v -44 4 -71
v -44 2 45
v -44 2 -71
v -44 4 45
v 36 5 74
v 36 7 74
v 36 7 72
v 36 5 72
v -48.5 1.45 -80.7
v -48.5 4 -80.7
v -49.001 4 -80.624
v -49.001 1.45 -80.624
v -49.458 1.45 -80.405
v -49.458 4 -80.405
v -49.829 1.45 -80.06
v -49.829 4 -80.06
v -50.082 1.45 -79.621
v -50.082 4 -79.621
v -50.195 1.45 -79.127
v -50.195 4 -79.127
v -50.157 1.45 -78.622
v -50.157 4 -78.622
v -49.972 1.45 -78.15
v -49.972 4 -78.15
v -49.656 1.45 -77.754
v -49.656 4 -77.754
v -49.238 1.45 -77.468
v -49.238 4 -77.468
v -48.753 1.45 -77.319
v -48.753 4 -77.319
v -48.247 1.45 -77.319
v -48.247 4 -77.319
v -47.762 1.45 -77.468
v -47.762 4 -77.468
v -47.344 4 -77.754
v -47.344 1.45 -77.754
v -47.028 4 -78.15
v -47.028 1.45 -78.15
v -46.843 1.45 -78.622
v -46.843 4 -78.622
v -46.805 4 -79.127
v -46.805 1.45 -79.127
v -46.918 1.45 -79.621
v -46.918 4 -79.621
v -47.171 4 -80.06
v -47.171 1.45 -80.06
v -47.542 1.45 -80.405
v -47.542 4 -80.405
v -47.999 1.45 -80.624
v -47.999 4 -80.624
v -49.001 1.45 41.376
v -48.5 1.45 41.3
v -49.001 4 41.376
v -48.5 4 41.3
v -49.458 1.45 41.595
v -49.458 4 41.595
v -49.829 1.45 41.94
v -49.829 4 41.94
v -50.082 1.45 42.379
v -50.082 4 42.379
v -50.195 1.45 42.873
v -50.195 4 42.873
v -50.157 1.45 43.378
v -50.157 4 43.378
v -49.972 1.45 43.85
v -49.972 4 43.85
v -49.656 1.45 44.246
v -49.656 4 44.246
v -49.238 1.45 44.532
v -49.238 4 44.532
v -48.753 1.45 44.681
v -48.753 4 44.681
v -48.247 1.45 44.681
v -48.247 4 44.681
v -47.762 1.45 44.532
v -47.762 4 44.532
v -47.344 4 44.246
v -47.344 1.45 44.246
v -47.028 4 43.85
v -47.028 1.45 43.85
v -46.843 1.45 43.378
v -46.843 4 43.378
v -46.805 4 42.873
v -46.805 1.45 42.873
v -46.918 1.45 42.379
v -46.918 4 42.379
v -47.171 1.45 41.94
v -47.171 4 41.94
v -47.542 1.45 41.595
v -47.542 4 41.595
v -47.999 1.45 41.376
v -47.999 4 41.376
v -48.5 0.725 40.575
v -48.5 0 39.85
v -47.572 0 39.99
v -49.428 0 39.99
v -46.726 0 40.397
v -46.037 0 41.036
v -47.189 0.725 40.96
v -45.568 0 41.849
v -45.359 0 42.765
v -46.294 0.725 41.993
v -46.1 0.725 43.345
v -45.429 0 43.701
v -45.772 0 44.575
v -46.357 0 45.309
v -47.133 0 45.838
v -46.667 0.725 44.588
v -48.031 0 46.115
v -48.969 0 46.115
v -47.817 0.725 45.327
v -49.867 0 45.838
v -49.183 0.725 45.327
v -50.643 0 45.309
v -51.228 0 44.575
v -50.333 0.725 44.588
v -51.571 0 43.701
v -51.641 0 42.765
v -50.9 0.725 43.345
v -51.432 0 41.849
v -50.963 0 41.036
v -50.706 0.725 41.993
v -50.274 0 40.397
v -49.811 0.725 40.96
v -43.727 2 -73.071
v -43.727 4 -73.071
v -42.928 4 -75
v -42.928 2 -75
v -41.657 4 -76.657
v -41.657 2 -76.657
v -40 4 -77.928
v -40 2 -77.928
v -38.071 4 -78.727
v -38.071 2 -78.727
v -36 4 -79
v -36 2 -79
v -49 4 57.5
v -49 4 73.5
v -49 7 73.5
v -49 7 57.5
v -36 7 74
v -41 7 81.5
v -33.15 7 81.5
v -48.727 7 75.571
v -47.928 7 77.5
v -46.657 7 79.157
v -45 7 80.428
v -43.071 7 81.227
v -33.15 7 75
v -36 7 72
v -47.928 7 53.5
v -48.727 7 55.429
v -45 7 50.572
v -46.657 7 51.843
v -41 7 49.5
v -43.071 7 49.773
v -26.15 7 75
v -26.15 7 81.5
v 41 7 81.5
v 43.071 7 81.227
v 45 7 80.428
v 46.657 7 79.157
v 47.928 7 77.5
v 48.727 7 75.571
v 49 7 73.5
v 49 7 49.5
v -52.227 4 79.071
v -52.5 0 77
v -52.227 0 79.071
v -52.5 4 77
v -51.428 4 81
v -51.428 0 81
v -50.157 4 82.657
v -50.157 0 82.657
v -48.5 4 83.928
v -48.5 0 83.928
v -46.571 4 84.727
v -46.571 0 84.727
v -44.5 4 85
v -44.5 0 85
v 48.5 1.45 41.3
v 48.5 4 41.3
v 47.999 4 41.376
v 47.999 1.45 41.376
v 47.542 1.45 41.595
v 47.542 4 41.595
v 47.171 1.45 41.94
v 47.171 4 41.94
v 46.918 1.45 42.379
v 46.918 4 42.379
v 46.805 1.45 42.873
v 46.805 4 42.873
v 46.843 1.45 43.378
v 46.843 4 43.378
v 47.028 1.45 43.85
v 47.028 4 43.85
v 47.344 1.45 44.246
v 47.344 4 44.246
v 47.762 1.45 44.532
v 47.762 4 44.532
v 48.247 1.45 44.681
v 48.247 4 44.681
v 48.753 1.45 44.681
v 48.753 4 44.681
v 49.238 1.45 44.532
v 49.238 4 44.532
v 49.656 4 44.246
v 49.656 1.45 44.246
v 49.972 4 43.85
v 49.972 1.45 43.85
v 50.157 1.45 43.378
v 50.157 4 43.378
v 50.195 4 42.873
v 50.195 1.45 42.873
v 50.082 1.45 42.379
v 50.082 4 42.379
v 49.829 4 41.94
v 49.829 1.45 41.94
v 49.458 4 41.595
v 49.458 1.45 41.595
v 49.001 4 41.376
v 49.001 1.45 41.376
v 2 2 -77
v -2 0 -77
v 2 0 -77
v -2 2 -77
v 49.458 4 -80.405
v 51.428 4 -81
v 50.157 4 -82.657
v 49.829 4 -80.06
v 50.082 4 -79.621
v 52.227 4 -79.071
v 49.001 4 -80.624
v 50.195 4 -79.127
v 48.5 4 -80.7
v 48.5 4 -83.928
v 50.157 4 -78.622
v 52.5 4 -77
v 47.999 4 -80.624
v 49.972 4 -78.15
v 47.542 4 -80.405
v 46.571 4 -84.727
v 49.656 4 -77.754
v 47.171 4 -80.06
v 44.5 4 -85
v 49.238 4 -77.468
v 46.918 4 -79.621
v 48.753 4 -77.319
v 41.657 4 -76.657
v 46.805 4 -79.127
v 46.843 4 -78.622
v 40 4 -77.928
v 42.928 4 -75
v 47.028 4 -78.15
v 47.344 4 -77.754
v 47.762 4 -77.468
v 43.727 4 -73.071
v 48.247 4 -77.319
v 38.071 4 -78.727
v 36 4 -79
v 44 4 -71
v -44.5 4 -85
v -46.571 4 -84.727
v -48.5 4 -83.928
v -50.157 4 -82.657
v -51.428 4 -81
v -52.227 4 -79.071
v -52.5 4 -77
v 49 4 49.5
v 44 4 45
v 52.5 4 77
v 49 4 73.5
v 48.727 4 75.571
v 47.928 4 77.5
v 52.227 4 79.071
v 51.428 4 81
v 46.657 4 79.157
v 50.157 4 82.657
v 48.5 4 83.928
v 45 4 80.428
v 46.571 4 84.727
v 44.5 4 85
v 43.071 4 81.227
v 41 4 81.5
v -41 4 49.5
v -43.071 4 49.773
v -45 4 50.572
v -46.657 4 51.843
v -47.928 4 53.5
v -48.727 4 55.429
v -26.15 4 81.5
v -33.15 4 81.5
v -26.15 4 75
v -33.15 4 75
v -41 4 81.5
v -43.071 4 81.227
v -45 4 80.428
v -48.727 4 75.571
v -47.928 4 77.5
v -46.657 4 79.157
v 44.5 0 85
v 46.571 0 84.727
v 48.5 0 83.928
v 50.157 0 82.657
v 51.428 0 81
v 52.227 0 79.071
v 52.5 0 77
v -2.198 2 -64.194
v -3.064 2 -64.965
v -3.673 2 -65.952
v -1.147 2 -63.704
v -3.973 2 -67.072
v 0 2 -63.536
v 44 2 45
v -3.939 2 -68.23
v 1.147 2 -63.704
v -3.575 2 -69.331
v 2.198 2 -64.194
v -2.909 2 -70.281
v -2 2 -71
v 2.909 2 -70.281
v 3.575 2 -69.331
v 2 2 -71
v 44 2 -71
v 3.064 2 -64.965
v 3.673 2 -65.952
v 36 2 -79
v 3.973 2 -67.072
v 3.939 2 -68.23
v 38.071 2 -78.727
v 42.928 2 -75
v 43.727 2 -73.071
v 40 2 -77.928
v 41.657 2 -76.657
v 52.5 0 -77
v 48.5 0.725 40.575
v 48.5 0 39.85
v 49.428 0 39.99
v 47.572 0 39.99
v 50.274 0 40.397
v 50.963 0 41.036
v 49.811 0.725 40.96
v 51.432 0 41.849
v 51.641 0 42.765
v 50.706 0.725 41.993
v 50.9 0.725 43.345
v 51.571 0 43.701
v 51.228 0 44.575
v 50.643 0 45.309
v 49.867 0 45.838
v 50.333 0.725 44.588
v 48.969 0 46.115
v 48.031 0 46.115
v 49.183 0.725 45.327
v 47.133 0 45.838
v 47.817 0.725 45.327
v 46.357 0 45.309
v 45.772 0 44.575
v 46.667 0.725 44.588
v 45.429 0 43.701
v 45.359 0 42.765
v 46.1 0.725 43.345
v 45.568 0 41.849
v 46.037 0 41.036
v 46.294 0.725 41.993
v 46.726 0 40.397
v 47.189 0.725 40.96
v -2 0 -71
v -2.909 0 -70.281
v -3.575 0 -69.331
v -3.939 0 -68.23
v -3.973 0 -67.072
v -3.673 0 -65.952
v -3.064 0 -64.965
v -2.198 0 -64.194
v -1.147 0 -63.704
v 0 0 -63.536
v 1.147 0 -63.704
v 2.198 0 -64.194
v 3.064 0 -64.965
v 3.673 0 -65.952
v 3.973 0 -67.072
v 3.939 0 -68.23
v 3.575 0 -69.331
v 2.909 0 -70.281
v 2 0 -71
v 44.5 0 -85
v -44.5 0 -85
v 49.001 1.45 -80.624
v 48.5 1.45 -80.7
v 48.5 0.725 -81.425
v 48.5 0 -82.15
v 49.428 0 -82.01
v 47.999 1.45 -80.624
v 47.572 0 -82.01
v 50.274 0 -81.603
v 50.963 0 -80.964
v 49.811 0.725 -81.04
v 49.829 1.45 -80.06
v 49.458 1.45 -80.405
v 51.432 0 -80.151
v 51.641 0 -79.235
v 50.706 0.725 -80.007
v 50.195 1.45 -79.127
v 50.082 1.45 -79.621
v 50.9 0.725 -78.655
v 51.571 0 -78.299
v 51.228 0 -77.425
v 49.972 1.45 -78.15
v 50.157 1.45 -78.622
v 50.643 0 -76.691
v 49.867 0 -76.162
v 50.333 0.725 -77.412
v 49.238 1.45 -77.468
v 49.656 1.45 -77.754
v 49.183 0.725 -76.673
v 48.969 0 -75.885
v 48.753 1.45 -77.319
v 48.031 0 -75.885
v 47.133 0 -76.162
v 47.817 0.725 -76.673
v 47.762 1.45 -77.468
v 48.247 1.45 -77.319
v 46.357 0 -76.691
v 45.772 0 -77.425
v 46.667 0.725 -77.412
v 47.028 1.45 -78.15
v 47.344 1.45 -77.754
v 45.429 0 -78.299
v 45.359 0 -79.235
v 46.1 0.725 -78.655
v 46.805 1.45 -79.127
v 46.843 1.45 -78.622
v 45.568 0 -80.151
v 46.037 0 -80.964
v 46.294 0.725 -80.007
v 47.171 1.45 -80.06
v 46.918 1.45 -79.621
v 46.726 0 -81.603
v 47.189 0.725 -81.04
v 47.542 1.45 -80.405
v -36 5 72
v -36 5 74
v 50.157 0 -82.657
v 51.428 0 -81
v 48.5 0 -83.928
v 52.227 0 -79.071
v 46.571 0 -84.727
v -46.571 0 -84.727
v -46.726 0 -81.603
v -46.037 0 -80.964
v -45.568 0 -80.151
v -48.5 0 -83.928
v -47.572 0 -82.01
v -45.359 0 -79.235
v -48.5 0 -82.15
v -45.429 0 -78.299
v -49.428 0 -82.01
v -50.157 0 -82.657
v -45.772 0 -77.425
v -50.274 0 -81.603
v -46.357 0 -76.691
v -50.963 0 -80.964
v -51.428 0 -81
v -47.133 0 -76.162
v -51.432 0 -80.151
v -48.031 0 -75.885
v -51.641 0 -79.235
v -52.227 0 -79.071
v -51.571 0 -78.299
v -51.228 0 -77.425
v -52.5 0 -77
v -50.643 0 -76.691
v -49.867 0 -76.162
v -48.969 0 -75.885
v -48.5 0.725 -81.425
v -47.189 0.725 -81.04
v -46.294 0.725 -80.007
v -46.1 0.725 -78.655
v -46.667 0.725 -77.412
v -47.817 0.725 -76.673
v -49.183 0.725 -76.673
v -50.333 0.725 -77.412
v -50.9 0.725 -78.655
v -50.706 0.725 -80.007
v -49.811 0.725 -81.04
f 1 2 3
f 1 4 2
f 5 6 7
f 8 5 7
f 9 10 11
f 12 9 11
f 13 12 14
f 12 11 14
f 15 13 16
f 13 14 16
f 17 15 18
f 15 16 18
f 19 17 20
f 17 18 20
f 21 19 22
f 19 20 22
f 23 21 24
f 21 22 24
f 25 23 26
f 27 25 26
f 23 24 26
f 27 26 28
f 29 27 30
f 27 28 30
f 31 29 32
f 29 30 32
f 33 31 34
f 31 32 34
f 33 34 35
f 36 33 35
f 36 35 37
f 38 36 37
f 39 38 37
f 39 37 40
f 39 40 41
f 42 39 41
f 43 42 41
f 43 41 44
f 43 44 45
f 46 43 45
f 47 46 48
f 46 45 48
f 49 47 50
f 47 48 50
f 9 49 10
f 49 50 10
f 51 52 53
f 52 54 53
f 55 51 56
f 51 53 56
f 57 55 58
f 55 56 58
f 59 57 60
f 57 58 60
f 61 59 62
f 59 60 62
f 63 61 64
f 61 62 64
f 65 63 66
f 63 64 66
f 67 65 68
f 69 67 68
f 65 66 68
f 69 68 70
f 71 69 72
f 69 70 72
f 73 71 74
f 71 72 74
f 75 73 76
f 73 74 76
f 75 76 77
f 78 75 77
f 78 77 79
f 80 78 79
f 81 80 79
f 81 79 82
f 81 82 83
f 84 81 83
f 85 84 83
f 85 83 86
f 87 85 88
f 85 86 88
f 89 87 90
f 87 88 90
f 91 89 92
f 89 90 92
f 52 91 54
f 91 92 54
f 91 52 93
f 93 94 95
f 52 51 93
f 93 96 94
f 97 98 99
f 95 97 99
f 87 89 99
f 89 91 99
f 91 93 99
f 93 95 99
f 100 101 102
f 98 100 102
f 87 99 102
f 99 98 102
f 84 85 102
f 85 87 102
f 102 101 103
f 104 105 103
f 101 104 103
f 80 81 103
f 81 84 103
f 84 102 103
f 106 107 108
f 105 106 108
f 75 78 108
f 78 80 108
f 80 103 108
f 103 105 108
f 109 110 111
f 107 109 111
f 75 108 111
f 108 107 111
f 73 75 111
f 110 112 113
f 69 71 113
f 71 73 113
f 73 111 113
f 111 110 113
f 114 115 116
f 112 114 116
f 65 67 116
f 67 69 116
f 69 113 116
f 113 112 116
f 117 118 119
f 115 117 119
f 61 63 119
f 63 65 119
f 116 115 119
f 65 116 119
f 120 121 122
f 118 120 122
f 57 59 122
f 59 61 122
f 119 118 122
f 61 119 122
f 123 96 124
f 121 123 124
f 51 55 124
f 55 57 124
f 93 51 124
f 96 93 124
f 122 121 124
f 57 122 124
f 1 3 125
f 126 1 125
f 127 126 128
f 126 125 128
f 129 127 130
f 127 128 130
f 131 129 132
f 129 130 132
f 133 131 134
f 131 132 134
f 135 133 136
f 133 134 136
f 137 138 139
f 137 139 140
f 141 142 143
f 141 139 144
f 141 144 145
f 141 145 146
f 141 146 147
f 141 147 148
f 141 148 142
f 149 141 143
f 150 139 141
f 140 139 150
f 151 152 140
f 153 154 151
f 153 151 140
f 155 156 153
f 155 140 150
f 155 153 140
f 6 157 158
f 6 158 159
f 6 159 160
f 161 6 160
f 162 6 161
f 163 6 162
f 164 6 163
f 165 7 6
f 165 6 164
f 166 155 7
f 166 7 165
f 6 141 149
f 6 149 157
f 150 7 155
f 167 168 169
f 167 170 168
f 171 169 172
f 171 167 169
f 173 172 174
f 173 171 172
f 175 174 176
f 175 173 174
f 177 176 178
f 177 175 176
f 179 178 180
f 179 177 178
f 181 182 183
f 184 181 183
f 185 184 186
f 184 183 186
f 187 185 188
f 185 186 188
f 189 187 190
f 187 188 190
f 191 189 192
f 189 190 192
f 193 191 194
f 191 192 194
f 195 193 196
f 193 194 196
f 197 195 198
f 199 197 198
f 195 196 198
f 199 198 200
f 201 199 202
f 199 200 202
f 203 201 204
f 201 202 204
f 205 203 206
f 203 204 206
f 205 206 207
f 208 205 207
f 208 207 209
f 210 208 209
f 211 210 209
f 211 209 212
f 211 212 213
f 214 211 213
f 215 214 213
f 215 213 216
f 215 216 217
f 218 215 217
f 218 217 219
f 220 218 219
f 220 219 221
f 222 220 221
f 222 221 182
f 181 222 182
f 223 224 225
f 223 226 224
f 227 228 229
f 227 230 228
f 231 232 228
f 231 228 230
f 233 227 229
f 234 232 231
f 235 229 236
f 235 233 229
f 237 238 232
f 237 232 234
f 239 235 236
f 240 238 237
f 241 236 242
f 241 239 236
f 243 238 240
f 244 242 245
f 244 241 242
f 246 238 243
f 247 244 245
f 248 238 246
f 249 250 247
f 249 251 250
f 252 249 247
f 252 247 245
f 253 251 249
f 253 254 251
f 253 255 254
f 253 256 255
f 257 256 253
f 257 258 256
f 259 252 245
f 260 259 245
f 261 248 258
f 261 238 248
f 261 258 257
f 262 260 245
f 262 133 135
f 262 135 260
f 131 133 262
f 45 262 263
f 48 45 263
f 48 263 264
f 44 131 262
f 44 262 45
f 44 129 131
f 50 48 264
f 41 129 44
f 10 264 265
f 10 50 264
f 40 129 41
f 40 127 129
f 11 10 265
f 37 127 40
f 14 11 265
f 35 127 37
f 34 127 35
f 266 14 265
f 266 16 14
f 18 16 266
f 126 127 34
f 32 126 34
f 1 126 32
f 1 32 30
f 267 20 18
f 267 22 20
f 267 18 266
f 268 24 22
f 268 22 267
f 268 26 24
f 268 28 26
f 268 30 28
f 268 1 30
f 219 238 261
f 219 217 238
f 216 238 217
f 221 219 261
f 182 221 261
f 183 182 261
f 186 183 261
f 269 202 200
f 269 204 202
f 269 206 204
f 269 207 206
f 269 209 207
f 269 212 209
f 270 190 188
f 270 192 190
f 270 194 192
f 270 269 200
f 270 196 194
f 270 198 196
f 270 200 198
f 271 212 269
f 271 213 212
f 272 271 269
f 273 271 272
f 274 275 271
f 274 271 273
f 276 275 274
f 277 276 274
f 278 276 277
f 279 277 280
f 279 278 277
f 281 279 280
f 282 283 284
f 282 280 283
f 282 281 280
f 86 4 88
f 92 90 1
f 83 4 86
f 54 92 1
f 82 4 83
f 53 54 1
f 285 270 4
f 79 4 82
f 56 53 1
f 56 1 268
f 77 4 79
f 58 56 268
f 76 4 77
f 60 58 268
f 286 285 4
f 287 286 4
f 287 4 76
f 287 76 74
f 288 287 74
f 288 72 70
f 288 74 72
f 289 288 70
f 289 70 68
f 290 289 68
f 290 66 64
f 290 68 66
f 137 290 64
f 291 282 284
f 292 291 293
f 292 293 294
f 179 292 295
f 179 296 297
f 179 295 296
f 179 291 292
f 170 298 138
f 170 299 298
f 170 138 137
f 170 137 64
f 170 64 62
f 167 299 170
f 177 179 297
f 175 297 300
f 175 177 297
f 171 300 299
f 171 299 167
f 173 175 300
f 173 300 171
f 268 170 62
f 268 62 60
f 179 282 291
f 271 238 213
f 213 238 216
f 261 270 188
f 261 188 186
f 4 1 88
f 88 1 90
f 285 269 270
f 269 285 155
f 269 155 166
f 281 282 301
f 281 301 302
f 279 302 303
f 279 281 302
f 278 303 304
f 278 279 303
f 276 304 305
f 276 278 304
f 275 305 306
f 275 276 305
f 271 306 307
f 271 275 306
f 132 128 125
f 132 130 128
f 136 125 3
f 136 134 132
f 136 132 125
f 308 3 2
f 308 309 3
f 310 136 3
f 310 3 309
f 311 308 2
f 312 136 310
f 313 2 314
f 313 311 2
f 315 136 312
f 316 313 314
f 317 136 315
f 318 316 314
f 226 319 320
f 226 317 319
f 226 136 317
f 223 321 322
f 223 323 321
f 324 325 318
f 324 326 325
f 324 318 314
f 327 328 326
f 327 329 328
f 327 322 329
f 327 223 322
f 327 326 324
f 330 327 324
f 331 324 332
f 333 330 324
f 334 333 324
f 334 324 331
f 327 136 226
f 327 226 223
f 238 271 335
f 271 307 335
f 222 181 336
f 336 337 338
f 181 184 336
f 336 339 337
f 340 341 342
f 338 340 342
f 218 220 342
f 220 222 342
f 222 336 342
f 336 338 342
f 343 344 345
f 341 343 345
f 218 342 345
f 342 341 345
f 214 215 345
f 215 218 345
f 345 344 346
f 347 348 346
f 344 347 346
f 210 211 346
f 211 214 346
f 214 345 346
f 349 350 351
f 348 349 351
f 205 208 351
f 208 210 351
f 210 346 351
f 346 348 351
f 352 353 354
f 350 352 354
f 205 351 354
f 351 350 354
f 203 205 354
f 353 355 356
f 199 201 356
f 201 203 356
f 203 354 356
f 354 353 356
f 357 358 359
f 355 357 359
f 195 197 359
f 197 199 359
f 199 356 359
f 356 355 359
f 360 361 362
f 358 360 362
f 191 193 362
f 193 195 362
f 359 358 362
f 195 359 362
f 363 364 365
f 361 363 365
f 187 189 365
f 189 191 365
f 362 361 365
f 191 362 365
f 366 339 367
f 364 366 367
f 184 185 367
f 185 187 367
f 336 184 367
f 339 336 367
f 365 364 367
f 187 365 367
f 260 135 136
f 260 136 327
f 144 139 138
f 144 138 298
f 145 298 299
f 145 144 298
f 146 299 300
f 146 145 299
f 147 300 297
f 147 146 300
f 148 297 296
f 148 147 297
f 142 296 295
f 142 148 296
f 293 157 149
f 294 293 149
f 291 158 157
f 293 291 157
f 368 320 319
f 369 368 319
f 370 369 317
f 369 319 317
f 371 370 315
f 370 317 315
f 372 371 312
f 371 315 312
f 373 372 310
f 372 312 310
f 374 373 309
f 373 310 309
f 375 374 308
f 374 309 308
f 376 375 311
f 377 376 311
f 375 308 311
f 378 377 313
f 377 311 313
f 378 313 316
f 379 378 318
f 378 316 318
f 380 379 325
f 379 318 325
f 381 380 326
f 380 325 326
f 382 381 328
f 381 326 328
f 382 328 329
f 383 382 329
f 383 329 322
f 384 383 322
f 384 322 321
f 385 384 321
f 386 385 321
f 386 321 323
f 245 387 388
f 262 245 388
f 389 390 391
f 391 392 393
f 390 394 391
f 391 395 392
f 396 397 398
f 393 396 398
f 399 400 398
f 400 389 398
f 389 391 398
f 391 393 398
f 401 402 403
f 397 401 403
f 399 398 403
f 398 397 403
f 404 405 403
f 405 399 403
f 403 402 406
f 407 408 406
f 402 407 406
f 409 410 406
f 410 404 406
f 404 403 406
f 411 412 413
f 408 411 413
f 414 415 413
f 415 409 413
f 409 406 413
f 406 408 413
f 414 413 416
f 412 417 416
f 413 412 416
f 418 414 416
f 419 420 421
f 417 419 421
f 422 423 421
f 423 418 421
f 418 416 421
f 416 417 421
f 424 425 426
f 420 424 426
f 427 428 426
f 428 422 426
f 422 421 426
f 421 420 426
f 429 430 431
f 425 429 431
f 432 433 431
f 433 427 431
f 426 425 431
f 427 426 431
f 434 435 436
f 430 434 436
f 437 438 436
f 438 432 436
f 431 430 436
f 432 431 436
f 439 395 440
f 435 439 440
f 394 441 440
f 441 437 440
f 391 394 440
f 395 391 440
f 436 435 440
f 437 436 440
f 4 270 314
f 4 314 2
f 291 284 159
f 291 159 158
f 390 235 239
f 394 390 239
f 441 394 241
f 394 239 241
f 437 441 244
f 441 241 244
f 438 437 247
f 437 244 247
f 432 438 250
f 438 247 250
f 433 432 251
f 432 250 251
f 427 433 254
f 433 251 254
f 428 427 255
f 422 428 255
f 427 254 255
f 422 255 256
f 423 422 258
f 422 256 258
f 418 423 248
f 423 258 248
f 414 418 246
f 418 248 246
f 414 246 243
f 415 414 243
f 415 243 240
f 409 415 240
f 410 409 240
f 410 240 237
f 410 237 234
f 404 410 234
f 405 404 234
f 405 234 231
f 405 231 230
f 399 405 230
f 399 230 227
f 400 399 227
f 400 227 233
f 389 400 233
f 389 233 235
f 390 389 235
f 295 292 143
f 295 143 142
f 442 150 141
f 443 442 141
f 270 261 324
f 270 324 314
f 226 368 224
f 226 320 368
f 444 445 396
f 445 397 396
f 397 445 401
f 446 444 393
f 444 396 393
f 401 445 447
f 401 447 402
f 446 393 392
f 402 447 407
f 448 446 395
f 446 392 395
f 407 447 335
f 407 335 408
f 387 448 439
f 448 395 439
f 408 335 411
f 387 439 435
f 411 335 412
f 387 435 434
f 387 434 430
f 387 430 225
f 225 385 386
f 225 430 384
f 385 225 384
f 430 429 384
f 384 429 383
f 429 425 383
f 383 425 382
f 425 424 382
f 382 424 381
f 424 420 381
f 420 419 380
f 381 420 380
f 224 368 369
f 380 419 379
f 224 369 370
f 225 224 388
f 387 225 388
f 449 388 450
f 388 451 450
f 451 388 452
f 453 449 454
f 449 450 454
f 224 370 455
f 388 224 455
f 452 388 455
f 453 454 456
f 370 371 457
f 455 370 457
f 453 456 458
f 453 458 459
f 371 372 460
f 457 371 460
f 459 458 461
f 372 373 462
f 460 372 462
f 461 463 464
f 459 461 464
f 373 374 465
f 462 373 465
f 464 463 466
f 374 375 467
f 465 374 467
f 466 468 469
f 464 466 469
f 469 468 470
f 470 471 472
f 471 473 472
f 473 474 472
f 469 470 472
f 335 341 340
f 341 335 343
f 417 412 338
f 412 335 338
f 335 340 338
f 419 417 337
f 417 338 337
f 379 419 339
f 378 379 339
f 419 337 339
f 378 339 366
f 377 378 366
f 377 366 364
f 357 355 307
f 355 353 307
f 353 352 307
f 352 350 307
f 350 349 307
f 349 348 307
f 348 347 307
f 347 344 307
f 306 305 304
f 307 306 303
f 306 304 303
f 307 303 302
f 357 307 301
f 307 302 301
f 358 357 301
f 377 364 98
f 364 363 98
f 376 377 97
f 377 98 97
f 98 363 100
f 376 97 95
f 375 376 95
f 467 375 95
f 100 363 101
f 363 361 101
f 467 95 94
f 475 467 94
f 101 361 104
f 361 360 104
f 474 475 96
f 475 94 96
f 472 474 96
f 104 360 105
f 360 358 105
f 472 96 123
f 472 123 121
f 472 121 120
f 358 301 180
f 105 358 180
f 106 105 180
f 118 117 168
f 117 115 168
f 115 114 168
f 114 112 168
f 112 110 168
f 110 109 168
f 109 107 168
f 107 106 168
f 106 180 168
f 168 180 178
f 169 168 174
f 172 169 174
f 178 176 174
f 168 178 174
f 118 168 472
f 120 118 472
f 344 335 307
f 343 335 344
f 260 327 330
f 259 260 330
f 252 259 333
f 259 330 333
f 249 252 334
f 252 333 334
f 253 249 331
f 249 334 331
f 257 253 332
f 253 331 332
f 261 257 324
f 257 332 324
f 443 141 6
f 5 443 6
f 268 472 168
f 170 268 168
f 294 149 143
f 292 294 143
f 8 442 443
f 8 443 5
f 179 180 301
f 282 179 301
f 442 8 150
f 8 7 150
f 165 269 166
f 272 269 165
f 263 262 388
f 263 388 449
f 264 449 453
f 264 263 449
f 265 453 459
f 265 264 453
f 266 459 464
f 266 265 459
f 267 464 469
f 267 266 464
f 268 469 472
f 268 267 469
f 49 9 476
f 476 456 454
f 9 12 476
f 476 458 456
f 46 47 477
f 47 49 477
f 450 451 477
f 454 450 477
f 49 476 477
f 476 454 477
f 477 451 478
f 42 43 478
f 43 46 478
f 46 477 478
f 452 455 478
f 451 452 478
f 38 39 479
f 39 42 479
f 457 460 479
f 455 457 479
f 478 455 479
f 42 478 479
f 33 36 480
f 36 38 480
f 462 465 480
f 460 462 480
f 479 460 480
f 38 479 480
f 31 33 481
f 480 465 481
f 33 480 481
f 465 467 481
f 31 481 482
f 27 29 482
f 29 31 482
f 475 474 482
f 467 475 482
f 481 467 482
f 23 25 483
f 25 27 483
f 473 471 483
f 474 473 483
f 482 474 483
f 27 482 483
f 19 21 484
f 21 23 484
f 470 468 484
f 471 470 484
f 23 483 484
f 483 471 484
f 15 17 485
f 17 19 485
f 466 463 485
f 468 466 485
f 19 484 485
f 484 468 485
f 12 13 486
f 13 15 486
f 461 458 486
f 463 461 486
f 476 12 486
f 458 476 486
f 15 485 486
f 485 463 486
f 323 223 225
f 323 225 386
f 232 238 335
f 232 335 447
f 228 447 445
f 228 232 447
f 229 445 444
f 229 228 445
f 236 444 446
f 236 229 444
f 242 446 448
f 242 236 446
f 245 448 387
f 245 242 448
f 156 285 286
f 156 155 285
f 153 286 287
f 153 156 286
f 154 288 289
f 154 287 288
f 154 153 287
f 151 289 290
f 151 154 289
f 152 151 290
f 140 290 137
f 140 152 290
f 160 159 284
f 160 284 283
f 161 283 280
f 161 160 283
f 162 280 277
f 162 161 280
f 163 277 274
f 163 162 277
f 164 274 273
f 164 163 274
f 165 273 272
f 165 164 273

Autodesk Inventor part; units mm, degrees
ref_plane "YZ Plane" through (0, 0, 0) normal (1, 0, 0) x (0, 1, 0)
ref_plane "XZ Plane" through (0, 0, 0) normal (0, 1, 0) x (-1, 0, 0)
ref_plane "XY Plane" through (0, 0, 0) normal (0, 0, 1) x (1, 0, 0)
sketch "Sketch1" plane through (0, 0, 0) normal (0, 1, 0) x (-1, 0, 0)
  line L0 (52.5, 85) -> (-52.5, 85)
  line L1 (-52.5, 85) -> (-52.5, -85)
  line L2 (-52.5, -85) -> (52.5, -85)
  line L3 (52.5, -85) -> (52.5, 85)
  line L4 (52.5, 85) -> (-52.5, -85) construction
  line L5 (-52.5, 85) -> (52.5, -85) construction
  point P0 (0, 0)
  dimension "d0" = 170
  dimension "d1" = 105
extrude "Extrusion1" add sketch "Sketch1" along normal blind 4
sketch "Sketch2" plane through (0, 4, 0) normal (0, 1, 0) x (1, 0, 0)
  line L0 (-44, 79) -> (44, 79)
  line L1 (44, 79) -> (44, -45)
  line L2 (44, -45) -> (-44, -45)
  line L3 (-44, -45) -> (-44, 79)
  line L4 (52.5, 85) -> (-52.5, 85) projected
  point P0 (0, 0)
  point P1 (0, 79)
  dimension "d4" = 124
  dimension "d5" = 88
  dimension "d6" = 6
extrude "Extrusion2" cut sketch "Sketch2" against normal blind 2
sketch "Sketch3" plane through (0, 4, 0) normal (0, 1, 0) x (1, 0, 0)
  line L0 (-49, -49.5) -> (49, -49.5)
  line L1 (49, -49.5) -> (49, -81.5)
  line L2 (49, -81.5) -> (-49, -81.5)
  line L3 (-49, -81.5) -> (-49, -49.5)
  line L4 (-52.5, 85) -> (-52.5, -85) projected
  line L5 (-52.5, -85) -> (52.5, -85) projected
  point P0 (0, 0)
  point P1 (0, -49.5)
  dimension "d9" = 3.5
  dimension "d10" = 3.5
  dimension "d11" = 32
extrude "Extrusion3" add sketch "Sketch3" along normal blind 3
fillet "Fillet1" radius 8 9 edges at (52.5, 2, 85) (-52.5, 2, 85) (52.5, 2, -85) (-52.5, 2, -85) (-44, 3, -79) (44, 3, -79) (-49, 5.5, 49.5) (-49, 5.5, 81.5) (49, 5.5, 81.5)
sketch "Sketch4" plane through (0, 0, 0) normal (0, -1, 0) x (1, 0, 0)
  line L0 (48.5, -79) -> (-48.5, -79) construction
  line L1 (-48.5, -79) -> (-48.5, 43) construction
  line L2 (-48.5, 43) -> (48.5, 43) construction
  line L3 (48.5, 43) -> (48.5, -79) construction
  line L4 (52.5, 77) -> (52.5, -77) projected
  line L5 (44.5, -85) -> (-44.5, -85) construction
  point P0 (0, 0)
  point P1 (0, -79)
  dimension "d15" = 4
  dimension "d16" = 122
  dimension "d17" = 6
hole "Hole1" at (48.5, 0, -79) at (-48.5, 0, -79) at (-48.5, 0, 43) at (48.5, 0, 43) direction (0, 1, 0) diameter 3.4 depth 8 tip angle 118 countersink diameter 6.3 countersink angle 90 clearance for "Countersunk Flat Head Screw DIN EN ISO 2009" size "M3" standard "DIN"
sketch "Sketch5" plane through (0, 2, 0) normal (0, 1, 0) x (1, 0, 0)
  arc A0 (-2, 71) -> (2, 71) centre (0, 67.5359) ccw
  line L0 (-2, 71) -> (-2, 77)
  line L1 (-2, 77) -> (2, 77)
  line L2 (2, 77) -> (2, 71)
  line L3 (-36, 79) -> (36, 79) projected
  point P0 (0, 0)
  point P1 (0, 77)
  dimension "d25" = 4
  dimension "d26" = 4
  dimension "d27" = 6
  dimension "d28" = 2
extrude "Extrusion4" cut sketch "Sketch5" against normal blind 10
sketch "Sketch6" plane through (0, 7, 0) normal (0, 1, 0) x (1, 0, 0)
  line L0 (-41, -81.5) -> (41, -81.5) projected
  line L1 (-33.15, -81.5) -> (-26.15, -81.5)
  line L2 (-26.15, -81.5) -> (-26.15, -75)
  line L3 (-26.15, -75) -> (-33.15, -75)
  line L4 (-33.15, -75) -> (-33.15, -81.5)
  line L5 (-49, -57.5) -> (-49, -73.5) projected
  point P0 (0, 0)
  dimension "d31" = 15.85
  dimension "d32" = 7
  dimension "d33" = 6.5
extrude "Extrusion5" cut sketch "Sketch6" against normal up to surface (3 mm away)
sketch "Sketch7" plane through (0, 7, 0) normal (0, 1, 0) x (1, 0, 0)
  line L0 (-36, -74) -> (36, -74)
  line L1 (36, -74) -> (36, -72)
  line L2 (36, -72) -> (-36, -72)
  line L3 (-36, -72) -> (-36, -74)
  line L4 (-26.15, -81.5) -> (41, -81.5) projected
  point P0 (0, 0)
  point P1 (0, -72)
  dimension "d36" = 72
  dimension "d37" = 2
  dimension "d38" = 7.5
extrude "Extrusion6" cut sketch "Sketch7" against normal blind 2
properties part number "Top"
